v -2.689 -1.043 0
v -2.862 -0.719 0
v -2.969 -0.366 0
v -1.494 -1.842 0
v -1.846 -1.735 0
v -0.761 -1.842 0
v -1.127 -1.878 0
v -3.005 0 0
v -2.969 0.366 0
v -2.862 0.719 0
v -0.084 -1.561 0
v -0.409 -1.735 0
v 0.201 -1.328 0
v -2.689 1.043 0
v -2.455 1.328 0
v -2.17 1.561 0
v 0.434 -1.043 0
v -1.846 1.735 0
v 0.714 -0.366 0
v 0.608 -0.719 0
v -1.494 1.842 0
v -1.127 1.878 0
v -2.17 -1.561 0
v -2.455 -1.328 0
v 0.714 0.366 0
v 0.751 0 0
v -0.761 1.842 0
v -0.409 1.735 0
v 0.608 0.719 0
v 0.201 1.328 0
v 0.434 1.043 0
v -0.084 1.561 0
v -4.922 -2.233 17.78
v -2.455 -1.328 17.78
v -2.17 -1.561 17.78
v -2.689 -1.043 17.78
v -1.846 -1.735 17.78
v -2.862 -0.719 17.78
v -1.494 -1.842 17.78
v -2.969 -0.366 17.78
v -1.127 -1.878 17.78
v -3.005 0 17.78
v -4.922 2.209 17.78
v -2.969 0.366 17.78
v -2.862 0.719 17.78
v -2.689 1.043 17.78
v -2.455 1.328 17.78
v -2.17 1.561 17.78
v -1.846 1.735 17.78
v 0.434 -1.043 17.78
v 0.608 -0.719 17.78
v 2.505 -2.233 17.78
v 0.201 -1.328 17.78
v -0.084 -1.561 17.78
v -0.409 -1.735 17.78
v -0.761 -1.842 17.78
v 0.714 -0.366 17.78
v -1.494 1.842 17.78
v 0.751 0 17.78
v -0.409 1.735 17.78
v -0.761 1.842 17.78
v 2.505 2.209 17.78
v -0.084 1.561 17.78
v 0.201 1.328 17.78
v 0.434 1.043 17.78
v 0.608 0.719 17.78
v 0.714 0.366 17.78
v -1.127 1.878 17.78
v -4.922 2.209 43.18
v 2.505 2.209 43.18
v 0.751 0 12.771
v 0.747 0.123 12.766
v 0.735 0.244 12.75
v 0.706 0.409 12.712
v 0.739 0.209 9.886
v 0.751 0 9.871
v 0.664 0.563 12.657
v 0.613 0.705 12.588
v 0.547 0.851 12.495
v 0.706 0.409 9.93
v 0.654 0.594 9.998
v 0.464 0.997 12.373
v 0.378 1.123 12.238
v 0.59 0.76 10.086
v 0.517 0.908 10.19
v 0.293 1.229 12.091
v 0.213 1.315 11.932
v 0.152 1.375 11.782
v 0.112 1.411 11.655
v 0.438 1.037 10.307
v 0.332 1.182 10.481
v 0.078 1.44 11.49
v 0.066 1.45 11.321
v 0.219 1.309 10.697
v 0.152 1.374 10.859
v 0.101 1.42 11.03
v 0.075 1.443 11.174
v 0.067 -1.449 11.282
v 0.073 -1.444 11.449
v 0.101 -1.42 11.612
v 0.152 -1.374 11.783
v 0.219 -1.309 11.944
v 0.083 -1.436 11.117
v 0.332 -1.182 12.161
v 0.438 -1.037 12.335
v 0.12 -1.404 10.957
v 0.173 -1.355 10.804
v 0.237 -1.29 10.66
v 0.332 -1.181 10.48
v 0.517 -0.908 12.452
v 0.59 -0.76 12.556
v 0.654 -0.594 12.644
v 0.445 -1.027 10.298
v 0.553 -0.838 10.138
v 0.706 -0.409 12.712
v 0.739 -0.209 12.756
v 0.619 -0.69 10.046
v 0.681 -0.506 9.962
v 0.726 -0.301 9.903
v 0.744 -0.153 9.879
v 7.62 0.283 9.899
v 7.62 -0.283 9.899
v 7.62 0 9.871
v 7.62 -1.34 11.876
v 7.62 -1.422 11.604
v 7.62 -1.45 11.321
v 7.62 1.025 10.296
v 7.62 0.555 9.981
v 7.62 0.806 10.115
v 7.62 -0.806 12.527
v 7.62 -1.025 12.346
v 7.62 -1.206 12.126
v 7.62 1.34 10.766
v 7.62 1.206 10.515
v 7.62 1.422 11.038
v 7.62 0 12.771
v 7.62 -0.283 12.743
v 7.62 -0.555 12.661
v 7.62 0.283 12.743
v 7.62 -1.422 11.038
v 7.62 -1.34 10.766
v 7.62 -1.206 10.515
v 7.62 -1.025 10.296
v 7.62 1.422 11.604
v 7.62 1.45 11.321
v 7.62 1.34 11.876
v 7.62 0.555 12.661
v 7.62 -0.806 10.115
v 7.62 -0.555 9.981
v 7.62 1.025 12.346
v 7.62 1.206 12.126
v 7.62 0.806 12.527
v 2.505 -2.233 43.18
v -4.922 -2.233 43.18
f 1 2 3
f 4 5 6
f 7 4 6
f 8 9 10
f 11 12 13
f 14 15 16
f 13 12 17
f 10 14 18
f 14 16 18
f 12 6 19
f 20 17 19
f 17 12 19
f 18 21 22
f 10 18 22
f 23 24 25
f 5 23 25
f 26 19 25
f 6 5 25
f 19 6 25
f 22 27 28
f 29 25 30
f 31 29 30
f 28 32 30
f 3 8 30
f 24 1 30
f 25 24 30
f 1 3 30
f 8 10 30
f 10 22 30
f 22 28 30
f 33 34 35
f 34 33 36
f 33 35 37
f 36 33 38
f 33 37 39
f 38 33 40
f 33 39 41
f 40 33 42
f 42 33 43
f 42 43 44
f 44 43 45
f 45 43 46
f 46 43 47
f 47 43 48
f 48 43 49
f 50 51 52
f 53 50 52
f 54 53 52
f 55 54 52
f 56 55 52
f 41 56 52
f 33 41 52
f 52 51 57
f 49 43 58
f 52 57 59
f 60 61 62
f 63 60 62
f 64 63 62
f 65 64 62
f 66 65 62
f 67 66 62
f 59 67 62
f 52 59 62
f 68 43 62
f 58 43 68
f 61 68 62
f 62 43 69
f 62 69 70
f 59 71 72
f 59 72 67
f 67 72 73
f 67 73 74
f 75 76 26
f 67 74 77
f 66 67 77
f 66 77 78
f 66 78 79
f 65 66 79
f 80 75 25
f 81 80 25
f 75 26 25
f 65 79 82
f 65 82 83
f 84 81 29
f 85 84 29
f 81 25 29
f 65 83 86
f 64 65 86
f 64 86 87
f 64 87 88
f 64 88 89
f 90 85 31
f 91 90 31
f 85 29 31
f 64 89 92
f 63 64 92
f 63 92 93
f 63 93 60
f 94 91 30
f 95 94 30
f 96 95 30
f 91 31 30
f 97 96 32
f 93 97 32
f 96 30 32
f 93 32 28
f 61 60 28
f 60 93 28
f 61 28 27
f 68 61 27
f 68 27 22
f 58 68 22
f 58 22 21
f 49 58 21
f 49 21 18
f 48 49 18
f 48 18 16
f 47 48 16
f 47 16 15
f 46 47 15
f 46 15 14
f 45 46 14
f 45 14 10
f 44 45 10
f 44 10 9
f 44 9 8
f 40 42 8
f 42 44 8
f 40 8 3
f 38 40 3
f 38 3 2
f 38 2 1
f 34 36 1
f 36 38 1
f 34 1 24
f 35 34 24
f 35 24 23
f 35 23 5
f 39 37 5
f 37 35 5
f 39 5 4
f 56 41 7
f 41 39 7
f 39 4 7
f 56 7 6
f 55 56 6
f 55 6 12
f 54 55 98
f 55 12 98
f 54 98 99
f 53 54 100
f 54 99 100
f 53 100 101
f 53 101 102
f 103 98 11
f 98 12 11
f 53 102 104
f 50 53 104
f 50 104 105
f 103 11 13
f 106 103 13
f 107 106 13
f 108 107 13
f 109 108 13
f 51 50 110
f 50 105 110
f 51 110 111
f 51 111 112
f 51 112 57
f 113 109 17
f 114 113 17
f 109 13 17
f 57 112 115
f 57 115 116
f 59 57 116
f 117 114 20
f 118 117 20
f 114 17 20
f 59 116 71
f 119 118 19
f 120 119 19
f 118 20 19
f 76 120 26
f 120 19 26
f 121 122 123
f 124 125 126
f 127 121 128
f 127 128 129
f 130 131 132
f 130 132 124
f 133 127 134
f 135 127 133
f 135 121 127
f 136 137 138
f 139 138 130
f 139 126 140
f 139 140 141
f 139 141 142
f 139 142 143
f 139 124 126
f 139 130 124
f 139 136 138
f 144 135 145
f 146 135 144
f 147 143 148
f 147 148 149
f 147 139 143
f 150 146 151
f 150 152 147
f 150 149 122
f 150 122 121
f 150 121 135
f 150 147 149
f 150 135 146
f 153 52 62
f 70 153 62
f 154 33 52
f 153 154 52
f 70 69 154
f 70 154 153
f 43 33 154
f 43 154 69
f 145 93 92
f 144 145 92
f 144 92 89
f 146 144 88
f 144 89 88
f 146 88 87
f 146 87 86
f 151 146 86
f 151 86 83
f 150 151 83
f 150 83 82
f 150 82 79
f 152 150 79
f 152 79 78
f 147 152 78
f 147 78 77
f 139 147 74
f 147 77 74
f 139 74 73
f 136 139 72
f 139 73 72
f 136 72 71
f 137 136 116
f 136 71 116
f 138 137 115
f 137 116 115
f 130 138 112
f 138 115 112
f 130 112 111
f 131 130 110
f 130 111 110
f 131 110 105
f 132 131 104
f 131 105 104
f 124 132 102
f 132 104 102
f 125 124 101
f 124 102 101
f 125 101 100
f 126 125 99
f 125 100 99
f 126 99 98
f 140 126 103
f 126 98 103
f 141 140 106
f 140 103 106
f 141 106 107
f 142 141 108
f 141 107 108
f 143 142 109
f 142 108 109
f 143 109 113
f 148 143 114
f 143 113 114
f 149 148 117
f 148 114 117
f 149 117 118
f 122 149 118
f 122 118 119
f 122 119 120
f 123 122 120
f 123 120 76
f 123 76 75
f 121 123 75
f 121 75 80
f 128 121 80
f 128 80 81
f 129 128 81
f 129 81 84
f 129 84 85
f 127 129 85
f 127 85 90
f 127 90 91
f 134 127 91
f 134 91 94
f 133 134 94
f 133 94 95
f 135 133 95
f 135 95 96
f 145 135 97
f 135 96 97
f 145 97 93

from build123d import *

# Parameters (mm, degrees)
F0_R     = 1.45
F1_DEPTH = 7.62
F2_R     = 1.877804
F3_DEPTH = 25.4
F5_W     = 7.426485
F5_H     = 4.44201
F6_DEPTH = 25.4


with BuildPart() as f1:
    # F0 (on Right) → F1 (new body)
    with BuildSketch(Plane.YZ):
        with Locations((0, 11.320898)):
            Circle(F0_R)
    extrude(amount=F1_DEPTH)

    # F2 (on Top) → F3 (join)
    with BuildSketch(Plane.XY):
        with Locations((-1.127225, 0)):
            Circle(F2_R)
    extrude(amount=F3_DEPTH)

    # F5 (on offset) → F6 (join)
    with BuildSketch(Plane.XY.offset(17.78)):
        with Locations((-1.208354, -0.011814)):
            Rectangle(F5_W, F5_H)
    extrude(amount=F6_DEPTH)


solid = f1.part
